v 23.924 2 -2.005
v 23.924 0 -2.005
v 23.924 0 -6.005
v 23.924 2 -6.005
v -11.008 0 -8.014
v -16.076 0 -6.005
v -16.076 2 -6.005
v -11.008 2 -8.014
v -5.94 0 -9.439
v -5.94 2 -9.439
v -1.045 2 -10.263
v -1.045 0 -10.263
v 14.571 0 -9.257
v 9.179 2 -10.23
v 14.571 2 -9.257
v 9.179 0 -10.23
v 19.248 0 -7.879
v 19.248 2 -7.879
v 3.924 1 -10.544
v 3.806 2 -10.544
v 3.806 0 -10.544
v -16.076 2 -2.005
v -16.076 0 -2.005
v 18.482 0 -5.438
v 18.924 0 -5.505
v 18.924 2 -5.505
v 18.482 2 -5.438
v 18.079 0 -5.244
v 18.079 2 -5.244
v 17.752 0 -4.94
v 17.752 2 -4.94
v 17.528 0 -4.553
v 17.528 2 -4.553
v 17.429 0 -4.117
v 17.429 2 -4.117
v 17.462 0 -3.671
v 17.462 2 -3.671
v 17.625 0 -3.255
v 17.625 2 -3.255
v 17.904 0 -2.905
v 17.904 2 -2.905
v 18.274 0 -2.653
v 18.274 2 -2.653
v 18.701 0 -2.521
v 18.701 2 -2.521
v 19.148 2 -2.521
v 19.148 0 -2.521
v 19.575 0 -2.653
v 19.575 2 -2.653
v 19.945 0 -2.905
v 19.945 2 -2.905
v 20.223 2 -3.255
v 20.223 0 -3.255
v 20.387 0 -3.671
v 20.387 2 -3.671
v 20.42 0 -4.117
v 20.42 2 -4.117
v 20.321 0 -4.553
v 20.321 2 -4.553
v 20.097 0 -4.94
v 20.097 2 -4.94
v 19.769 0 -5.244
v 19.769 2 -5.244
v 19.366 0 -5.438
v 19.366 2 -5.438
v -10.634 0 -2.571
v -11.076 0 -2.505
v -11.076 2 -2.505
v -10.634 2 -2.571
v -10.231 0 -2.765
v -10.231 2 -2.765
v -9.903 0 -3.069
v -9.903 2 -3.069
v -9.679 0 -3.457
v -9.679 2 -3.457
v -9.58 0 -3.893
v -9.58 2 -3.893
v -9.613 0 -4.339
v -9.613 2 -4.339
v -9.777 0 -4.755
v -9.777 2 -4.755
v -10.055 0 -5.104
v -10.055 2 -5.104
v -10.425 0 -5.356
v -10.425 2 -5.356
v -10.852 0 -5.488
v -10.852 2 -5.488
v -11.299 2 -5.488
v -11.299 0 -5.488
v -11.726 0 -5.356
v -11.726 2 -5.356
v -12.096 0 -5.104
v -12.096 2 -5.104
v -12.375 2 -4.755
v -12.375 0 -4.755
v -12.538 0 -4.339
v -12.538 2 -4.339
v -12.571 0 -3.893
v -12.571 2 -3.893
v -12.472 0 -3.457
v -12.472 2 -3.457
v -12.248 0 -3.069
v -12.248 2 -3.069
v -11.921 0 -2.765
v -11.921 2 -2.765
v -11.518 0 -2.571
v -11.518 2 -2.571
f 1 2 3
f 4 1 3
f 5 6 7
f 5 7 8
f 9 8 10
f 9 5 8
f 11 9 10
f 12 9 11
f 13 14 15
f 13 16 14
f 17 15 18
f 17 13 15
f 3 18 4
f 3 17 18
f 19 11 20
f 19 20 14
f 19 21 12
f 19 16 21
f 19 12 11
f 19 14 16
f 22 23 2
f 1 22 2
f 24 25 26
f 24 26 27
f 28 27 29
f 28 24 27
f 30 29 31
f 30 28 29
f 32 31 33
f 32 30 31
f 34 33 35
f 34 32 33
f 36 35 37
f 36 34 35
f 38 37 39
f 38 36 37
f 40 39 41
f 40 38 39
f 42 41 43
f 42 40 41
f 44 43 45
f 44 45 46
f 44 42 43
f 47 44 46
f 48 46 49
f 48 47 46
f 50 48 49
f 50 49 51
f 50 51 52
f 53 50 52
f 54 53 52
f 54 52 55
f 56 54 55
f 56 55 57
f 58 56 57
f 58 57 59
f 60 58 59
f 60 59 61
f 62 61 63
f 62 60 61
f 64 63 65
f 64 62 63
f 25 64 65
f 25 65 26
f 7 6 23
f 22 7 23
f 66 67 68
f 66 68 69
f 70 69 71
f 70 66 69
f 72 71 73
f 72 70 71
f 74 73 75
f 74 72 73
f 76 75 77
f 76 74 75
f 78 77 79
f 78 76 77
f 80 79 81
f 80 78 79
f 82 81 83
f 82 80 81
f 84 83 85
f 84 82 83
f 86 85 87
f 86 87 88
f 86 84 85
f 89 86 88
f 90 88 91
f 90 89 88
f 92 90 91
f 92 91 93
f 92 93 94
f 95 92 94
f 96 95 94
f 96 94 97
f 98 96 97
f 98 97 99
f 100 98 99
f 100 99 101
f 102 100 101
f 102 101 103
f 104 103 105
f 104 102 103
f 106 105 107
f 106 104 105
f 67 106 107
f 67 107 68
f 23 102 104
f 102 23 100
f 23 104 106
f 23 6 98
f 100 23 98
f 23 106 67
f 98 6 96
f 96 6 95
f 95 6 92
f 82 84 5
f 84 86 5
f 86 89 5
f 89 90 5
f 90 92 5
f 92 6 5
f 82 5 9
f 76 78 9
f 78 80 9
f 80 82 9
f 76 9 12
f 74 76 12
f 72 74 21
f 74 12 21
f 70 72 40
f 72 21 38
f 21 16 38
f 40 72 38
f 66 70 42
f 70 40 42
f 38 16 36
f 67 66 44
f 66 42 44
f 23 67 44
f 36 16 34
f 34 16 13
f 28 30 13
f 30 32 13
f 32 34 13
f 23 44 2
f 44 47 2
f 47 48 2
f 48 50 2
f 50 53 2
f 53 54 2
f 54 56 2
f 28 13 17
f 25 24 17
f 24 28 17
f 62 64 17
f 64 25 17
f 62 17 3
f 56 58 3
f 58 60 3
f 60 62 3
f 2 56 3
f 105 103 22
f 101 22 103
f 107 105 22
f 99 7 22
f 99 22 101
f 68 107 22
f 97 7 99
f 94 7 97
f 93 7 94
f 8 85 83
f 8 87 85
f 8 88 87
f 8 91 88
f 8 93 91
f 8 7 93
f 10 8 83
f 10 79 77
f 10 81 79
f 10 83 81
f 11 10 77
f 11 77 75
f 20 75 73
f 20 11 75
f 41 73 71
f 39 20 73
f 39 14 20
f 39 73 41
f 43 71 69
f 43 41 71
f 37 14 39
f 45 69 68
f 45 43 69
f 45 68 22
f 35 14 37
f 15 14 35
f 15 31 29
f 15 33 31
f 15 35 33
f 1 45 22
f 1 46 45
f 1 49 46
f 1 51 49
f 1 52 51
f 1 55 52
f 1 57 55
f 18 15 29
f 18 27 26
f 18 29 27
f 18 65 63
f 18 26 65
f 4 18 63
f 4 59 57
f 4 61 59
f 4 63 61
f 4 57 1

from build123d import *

# Parameters (mm, degrees)
SKETCH1_R           = 1.5
BOSS_EXTRUDE1_DEPTH = 2


with BuildPart() as part:
    # Sketch1 → Boss-Extrude1 (new body)
    with BuildSketch(Plane(origin=(0, 0, 0), x_dir=(1, 0, 0), z_dir=(0, 1, 0))):
        with BuildLine():
            Line((-16.075650118, 6.004728132), (-16.075650118, 2.004728132))
            Line((-16.075650118, 2.004728132), (23.924349882, 2.004728132))
            Line((23.924349882, 2.004728132), (23.924349882, 6.004728132))
            add(Edge.make_bspline(
                [(-16.075650118, 6.004728132), (3.924349882, 15.082742317), (23.924349882, 6.004728132)],
                knots=[0, 0, 0, 1, 1, 1], degree=2))
        make_face()
        with Locations(Location((-11.075650118, 4.004728132, 0), (0, 0, 270))):
            Circle(SKETCH1_R, mode=Mode.SUBTRACT)
        with Locations(Location((18.924349882, 4.004728132, 0), (0, 0, 90))):
            Circle(SKETCH1_R, mode=Mode.SUBTRACT)
    extrude(amount=BOSS_EXTRUDE1_DEPTH)


solid = part.part
